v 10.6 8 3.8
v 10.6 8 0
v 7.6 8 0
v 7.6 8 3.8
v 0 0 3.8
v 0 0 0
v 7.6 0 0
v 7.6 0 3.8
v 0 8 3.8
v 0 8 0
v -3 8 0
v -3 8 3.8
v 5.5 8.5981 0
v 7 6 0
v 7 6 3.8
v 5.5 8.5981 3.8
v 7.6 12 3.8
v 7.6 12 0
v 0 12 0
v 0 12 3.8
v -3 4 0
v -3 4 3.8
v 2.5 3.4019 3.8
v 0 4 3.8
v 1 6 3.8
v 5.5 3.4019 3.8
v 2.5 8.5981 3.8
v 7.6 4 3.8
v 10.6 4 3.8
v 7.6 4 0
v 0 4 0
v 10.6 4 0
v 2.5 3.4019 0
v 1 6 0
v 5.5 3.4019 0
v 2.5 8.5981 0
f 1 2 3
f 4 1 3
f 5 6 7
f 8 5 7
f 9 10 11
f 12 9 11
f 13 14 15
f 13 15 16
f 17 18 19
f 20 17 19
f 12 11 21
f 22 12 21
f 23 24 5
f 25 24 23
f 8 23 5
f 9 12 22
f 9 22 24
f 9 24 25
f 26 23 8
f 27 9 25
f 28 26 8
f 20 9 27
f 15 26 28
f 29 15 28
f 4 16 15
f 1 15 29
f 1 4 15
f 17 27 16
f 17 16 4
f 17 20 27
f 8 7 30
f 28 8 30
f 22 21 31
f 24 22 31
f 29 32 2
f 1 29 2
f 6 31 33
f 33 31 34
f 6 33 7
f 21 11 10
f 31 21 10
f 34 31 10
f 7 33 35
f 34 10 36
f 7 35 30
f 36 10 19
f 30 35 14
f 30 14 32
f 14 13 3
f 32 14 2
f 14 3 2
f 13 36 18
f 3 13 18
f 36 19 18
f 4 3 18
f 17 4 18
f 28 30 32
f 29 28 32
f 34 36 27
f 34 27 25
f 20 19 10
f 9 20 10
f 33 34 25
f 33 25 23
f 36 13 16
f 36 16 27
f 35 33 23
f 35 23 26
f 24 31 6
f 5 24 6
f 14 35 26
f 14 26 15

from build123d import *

# Parameters (mm, degrees)
BOSS_EXTRUDE1_DEPTH = 3.8


with BuildPart() as part:
    # Sketch1 → Boss-Extrude1 (new body)
    with BuildSketch(Plane.XY):
        Polygon((0, 0), (7.6, 0), (7.6, 4), (10.6, 4), (10.6, 8), (7.6, 8), (7.6, 12), (0, 12), (0, 8), (-3, 8), (-3, 4), (0, 4), align=None)
        Polygon((7, 6), (5.5, 8.598076211), (2.5, 8.598076211), (1, 6), (2.5, 3.401923789), (5.5, 3.401923789), align=None, mode=Mode.SUBTRACT)
    extrude(amount=BOSS_EXTRUDE1_DEPTH)


solid = part.part
